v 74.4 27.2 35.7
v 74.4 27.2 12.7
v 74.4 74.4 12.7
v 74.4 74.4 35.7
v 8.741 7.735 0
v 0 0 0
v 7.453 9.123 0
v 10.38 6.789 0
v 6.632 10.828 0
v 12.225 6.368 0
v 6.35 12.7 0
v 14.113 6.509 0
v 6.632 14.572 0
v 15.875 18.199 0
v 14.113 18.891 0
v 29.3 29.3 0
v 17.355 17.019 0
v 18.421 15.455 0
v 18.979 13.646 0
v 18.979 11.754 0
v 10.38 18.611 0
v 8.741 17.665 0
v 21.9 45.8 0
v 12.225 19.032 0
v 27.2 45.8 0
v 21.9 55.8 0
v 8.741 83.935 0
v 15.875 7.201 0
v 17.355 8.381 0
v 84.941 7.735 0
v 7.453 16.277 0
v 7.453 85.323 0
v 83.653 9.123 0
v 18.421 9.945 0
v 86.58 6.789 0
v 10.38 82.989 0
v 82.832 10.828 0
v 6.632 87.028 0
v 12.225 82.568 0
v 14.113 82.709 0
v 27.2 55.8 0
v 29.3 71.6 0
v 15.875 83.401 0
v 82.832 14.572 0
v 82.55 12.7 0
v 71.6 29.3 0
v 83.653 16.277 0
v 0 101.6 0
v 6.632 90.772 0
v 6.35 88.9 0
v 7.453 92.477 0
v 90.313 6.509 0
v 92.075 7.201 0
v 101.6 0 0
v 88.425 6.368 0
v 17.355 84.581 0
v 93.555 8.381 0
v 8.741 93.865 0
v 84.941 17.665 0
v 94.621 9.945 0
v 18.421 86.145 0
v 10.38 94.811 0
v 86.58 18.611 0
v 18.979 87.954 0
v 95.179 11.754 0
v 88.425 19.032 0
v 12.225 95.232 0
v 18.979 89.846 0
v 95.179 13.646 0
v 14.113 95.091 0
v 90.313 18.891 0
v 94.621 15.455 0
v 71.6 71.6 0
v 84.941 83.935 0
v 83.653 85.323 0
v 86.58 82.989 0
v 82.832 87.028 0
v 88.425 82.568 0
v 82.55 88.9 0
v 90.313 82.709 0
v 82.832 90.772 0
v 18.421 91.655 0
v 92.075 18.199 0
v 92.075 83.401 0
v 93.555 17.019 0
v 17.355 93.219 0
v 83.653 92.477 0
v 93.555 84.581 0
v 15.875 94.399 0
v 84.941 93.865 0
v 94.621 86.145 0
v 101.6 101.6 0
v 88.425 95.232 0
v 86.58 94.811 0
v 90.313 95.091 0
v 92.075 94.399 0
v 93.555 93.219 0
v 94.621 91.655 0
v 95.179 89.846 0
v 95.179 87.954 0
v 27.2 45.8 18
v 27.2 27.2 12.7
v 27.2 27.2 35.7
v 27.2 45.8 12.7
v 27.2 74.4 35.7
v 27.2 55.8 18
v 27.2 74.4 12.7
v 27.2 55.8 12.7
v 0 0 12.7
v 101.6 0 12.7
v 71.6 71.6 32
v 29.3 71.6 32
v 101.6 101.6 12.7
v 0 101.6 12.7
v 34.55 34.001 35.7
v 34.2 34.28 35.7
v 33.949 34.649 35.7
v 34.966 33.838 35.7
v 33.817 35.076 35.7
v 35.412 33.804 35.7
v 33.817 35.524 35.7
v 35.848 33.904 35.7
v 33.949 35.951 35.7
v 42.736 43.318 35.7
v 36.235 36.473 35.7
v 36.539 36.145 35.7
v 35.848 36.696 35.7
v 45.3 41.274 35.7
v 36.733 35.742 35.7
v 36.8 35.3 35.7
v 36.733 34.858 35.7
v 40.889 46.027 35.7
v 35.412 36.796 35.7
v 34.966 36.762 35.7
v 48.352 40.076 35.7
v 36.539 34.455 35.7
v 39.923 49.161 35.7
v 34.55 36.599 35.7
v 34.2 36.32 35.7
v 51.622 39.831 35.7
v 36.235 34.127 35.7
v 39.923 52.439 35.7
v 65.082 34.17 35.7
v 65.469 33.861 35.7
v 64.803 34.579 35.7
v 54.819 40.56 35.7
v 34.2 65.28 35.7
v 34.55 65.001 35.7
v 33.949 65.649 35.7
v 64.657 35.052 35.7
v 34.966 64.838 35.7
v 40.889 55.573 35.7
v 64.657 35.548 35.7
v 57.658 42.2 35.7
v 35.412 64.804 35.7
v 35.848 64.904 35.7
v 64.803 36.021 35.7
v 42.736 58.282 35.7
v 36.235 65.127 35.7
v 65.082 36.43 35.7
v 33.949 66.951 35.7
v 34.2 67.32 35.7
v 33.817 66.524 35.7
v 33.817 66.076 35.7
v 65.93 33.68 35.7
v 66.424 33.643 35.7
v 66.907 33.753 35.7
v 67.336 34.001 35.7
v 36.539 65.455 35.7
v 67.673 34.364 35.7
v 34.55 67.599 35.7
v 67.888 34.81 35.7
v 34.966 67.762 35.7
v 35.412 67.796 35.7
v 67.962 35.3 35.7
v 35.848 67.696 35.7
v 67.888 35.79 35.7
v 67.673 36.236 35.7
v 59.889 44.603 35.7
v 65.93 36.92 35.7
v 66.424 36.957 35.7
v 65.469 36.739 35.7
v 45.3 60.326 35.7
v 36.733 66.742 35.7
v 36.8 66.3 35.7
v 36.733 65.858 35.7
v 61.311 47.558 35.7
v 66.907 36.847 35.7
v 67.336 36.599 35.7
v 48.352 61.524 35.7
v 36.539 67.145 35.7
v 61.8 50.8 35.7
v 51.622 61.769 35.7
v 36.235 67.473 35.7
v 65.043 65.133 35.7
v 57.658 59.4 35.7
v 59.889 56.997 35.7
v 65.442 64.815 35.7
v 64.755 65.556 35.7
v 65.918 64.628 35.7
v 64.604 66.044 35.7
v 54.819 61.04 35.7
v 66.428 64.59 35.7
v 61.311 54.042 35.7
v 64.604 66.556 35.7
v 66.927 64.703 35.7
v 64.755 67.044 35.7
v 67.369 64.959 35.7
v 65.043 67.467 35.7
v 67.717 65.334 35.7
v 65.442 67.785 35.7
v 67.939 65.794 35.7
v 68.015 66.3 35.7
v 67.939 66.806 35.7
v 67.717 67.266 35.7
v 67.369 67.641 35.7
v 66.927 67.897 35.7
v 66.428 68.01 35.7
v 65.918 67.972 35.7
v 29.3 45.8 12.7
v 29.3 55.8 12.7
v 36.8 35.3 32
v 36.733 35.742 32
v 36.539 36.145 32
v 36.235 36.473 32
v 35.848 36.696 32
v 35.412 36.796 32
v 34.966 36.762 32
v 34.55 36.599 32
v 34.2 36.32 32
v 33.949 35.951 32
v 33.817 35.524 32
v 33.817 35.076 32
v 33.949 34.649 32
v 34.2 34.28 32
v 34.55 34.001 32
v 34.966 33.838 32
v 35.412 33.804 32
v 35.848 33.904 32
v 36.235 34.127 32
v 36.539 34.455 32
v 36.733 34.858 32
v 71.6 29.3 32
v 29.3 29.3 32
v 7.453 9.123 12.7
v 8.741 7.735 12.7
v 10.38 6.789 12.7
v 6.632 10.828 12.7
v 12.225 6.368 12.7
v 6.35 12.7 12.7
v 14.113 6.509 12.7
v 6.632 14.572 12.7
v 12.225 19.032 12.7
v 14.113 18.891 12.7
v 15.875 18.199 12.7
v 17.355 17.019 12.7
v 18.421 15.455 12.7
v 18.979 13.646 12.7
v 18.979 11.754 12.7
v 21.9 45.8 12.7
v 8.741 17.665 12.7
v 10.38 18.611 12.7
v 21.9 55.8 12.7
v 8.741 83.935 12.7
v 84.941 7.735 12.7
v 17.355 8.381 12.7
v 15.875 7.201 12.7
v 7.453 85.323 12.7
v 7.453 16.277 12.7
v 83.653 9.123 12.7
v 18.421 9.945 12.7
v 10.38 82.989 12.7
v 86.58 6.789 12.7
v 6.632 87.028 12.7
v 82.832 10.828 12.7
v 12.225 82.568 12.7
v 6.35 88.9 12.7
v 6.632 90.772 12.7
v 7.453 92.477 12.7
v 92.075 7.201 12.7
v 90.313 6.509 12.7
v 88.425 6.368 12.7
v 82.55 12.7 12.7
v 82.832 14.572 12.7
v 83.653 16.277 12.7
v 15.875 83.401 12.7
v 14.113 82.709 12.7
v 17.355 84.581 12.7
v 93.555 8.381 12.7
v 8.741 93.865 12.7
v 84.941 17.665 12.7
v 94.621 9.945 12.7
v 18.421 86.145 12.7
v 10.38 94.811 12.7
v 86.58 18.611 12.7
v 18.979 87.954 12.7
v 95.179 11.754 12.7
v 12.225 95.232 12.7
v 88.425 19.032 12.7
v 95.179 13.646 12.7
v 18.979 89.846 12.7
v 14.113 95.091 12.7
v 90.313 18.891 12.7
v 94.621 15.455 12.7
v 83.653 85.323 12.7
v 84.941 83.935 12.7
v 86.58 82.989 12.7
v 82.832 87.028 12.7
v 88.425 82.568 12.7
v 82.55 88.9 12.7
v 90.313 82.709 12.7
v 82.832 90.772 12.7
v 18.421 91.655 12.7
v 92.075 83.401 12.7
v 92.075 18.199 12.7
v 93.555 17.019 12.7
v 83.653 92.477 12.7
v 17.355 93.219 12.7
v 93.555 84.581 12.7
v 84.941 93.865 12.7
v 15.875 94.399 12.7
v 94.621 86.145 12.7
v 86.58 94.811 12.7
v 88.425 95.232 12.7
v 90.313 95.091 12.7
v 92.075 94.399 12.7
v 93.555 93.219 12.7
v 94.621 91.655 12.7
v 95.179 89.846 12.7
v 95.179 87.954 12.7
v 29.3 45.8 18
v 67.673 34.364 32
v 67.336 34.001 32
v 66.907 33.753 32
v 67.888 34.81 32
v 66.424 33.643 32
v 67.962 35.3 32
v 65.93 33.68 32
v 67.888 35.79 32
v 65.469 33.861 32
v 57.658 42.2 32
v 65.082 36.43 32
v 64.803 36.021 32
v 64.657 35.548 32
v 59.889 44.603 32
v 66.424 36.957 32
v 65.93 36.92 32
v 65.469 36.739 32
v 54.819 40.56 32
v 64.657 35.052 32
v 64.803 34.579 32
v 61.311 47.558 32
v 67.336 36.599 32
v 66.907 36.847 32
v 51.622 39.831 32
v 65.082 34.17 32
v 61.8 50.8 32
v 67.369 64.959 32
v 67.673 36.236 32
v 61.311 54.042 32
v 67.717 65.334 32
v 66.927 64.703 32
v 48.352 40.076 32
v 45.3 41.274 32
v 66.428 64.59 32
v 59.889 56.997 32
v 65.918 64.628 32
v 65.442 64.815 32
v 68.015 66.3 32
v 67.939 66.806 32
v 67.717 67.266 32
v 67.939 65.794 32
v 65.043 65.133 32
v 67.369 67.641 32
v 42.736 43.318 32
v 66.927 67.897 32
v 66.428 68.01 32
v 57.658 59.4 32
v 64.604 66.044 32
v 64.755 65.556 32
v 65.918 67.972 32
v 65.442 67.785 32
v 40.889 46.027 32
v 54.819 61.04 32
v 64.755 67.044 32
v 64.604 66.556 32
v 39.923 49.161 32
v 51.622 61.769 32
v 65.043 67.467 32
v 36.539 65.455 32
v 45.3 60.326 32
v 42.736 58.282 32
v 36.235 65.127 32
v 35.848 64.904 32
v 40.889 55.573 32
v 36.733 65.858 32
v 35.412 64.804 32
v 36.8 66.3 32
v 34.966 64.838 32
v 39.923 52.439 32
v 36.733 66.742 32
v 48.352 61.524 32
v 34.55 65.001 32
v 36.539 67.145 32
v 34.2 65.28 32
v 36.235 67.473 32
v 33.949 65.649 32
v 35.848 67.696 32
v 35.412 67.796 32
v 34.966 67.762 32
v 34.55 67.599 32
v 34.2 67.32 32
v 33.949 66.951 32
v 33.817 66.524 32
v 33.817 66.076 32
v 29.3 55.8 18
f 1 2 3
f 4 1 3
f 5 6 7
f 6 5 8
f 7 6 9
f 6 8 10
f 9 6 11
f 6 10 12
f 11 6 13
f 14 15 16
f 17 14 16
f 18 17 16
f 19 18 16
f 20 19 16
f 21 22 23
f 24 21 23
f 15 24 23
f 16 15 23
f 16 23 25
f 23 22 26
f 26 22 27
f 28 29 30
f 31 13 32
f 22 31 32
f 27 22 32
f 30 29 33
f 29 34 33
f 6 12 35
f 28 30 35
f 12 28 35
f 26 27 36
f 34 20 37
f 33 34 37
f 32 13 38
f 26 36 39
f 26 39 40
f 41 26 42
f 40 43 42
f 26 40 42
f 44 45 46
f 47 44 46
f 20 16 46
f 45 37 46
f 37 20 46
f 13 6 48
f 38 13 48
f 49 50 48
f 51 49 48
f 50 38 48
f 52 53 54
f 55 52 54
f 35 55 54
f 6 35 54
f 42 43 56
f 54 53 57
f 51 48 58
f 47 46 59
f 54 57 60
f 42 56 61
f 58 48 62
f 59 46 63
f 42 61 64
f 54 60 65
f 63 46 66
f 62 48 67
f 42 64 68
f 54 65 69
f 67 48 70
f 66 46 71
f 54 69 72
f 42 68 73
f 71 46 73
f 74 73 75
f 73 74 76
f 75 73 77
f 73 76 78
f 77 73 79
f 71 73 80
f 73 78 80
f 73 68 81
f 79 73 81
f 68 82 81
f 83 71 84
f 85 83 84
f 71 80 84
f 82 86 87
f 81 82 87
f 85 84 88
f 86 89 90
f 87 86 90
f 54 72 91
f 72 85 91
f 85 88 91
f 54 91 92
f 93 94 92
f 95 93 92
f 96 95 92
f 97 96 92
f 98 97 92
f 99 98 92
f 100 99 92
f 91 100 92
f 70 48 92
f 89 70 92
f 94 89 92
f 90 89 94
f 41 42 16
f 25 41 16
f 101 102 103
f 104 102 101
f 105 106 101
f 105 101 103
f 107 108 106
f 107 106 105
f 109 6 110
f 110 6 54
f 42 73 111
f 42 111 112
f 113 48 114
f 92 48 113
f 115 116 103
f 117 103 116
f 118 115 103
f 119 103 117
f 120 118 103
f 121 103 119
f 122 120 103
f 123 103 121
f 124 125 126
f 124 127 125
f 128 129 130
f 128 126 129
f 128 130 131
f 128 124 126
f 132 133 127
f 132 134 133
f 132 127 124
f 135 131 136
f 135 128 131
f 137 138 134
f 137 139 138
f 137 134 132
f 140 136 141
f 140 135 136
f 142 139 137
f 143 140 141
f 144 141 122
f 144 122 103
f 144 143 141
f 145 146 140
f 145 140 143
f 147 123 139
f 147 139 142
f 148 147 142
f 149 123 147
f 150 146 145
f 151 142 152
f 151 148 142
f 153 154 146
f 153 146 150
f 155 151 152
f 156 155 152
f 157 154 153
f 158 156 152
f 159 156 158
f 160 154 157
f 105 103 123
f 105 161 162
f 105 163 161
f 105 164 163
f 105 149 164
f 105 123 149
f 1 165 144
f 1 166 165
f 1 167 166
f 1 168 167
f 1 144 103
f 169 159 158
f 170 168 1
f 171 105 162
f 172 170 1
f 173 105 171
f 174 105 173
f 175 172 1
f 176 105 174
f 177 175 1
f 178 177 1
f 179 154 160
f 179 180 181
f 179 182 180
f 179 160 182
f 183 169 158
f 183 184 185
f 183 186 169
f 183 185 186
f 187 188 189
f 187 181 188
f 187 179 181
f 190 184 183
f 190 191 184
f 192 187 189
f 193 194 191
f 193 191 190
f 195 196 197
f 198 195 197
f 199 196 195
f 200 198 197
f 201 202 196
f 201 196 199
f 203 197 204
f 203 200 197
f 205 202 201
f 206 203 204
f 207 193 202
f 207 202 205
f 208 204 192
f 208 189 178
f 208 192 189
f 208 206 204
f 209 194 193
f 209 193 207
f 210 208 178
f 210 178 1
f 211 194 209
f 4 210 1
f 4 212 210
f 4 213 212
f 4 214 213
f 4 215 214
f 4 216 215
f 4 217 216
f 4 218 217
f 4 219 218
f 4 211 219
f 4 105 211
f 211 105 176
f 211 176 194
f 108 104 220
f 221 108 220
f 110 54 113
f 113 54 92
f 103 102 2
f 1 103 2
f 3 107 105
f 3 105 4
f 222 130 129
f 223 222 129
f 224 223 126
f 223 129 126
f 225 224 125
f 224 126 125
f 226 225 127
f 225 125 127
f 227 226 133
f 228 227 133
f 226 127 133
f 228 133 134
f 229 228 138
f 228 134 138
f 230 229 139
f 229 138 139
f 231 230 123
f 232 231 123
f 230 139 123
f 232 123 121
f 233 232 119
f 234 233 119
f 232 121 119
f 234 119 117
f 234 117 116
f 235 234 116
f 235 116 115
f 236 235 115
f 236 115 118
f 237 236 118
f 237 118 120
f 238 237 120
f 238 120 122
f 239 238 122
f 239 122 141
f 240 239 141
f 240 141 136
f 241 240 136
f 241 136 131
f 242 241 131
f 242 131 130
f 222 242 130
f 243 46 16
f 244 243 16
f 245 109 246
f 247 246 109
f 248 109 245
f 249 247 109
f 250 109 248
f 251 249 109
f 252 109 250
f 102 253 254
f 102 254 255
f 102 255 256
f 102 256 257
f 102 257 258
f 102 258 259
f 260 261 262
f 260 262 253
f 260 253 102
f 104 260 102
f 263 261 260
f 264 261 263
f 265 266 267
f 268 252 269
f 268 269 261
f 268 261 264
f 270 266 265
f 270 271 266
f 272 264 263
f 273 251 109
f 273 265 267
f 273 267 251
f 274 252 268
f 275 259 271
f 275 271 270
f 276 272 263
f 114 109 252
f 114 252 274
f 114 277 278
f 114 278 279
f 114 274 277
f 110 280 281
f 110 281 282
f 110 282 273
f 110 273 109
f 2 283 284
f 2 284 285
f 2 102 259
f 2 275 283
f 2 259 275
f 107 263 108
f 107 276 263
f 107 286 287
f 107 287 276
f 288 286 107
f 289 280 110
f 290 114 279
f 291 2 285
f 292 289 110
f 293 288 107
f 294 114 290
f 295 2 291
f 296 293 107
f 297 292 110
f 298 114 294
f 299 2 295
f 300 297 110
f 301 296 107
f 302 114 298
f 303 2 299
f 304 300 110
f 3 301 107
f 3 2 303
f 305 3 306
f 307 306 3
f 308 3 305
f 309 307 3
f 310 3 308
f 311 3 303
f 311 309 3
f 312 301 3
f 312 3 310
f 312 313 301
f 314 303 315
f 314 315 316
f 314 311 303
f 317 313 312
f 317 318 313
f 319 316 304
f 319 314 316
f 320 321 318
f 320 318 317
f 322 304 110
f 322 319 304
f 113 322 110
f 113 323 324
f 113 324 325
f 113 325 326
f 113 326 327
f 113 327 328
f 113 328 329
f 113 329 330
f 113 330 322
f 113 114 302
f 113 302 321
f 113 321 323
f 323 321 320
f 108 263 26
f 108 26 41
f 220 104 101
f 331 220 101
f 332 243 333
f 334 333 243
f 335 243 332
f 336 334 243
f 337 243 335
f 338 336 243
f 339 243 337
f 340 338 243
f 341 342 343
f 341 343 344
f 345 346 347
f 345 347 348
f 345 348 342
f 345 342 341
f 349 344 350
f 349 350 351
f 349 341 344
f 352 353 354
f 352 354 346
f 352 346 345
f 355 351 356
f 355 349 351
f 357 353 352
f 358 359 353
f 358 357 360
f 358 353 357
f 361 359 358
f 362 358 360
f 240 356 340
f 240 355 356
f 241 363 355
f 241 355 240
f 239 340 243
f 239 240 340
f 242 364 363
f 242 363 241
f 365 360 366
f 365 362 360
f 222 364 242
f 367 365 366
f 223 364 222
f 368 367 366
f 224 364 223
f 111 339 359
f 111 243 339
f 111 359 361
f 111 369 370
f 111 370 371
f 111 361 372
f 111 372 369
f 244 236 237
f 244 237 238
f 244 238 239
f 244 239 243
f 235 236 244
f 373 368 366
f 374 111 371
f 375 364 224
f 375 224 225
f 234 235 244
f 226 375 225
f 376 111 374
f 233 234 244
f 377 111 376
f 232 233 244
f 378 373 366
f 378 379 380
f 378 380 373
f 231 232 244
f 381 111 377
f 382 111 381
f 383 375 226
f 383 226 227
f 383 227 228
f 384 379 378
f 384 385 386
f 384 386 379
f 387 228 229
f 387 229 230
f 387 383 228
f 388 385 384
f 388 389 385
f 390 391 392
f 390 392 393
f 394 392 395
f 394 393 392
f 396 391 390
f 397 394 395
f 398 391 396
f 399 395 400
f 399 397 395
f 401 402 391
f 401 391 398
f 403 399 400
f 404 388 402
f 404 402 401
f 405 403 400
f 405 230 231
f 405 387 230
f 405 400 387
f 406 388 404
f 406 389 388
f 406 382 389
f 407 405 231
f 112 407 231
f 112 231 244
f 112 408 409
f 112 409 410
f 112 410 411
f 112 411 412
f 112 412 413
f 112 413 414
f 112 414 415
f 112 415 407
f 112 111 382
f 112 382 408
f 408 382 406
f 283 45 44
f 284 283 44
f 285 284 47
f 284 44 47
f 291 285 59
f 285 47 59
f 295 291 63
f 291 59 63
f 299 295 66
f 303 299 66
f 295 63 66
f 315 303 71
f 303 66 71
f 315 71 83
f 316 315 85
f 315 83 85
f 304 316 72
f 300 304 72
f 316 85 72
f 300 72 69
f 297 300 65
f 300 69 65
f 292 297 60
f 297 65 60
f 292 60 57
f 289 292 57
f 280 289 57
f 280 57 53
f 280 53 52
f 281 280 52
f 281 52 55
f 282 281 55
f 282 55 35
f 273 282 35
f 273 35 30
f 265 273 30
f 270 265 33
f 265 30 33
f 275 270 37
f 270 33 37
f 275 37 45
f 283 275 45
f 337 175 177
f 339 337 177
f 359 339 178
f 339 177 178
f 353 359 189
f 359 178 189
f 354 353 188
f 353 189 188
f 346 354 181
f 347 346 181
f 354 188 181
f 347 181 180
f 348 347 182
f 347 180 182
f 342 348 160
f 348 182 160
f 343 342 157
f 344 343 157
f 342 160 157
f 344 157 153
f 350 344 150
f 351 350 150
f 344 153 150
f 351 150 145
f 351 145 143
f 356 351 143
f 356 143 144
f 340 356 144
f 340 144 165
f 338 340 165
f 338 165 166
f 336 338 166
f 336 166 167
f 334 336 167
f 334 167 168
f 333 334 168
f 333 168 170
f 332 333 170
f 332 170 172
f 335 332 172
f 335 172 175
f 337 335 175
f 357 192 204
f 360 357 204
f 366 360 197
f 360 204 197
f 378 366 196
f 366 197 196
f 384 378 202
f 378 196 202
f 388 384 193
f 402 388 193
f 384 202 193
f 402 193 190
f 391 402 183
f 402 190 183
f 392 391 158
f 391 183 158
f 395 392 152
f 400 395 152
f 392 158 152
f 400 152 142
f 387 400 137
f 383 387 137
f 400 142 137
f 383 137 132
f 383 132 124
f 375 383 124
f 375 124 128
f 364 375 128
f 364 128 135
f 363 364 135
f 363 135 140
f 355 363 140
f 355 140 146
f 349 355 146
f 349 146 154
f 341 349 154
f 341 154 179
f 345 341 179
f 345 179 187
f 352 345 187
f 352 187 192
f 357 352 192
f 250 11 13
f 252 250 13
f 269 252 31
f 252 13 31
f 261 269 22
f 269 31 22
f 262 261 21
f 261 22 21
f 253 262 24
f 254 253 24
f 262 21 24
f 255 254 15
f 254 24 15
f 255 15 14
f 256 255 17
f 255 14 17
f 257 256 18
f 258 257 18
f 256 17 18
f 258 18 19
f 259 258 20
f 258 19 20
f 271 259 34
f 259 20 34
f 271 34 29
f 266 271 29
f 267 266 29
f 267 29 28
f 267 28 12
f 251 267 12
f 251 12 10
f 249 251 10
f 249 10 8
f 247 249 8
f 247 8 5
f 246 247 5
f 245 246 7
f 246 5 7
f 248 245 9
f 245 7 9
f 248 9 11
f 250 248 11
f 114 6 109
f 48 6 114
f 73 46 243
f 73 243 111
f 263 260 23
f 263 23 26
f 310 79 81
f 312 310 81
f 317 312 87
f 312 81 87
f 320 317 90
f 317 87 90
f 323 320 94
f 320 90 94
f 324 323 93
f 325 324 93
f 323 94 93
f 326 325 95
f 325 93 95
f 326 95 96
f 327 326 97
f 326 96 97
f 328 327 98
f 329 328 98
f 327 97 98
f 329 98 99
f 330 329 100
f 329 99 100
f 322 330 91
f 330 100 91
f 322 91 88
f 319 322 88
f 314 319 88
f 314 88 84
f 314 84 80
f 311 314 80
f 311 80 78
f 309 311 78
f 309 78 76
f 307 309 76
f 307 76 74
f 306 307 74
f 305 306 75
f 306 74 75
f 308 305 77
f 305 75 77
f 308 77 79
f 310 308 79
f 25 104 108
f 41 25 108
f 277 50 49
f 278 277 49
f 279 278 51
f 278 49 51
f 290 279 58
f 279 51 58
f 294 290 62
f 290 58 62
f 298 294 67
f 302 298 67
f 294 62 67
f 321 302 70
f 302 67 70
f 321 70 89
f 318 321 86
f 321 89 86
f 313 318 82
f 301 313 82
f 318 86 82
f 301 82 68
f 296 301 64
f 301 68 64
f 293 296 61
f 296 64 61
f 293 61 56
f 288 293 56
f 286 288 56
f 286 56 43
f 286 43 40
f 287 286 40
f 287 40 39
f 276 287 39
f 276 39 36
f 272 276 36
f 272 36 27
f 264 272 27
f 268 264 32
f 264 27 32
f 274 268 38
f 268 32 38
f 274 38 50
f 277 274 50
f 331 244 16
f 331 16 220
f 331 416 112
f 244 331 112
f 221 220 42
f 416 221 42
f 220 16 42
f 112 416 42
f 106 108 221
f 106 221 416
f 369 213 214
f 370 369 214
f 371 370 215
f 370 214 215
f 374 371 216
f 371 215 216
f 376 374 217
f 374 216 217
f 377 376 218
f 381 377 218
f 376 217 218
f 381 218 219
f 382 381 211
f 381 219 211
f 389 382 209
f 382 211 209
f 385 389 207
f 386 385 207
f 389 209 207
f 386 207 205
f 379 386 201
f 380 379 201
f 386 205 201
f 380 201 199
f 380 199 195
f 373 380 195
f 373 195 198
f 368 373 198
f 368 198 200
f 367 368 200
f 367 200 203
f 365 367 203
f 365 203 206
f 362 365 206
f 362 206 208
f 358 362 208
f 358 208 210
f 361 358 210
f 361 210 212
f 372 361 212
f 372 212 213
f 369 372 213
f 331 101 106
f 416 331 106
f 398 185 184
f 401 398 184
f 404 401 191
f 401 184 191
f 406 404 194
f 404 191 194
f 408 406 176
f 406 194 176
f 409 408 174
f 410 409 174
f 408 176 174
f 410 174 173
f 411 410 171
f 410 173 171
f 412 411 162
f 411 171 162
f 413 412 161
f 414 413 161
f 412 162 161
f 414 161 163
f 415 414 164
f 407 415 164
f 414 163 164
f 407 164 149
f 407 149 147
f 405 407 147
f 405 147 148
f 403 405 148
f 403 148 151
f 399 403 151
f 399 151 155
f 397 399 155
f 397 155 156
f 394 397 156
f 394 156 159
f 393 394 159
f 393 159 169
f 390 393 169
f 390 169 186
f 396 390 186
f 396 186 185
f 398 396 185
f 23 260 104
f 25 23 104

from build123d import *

# Parameters (mm, degrees)
SKETCH1_W           = 101.6
SKETCH1_H           = 101.6
BOSS_EXTRUDE1_DEPTH = 12.7
SKETCH4_W           = 47.2
SKETCH4_H           = 47.2
BOSS_EXTRUDE3_DEPTH = 23
SKETCH5_W           = 42.3
SKETCH5_H           = 42.3
CUT_EXTRUDE1_DEPTH  = 32
SKETCH6_R           = 11
SKETCH6_R_2         = 1.5
SKETCH6_R_3         = 1.715206785
SKETCH6_R_4         = 1.661518809
CUT_EXTRUDE2_DEPTH  = 10
SKETCH7_W           = 5.3
SKETCH7_H           = 10
CUT_EXTRUDE3_DEPTH  = 5
SKETCH8_W           = 5.3
SKETCH8_H           = 10
CUT_EXTRUDE5_DEPTH  = 12.7
SKETCH9_R           = 6.35
CUT_EXTRUDE6_DEPTH  = 12.7


with BuildPart() as part:
    # Sketch1 → Boss-Extrude1 (new body)
    with BuildSketch(Plane.XY):
        with Locations((50.8, 50.8)):
            Rectangle(SKETCH1_W, SKETCH1_H)
    extrude(amount=BOSS_EXTRUDE1_DEPTH)

    # Sketch4 → Boss-Extrude3 (add)
    with BuildSketch(Plane.XY.offset(12.7)):
        with Locations((50.8, 50.8)):
            Rectangle(SKETCH4_W, SKETCH4_H)
    extrude(amount=BOSS_EXTRUDE3_DEPTH)

    # Sketch5 → Cut-Extrude1 (cut)
    with BuildSketch(Plane(origin=(0, 0, 0), x_dir=(-1, 0, 0), z_dir=(0, 0, -1))):
        with Locations((-50.45, 50.45)):
            Rectangle(SKETCH5_W, SKETCH5_H)
    extrude(amount=-CUT_EXTRUDE1_DEPTH, mode=Mode.SUBTRACT)

    # Sketch6 → Cut-Extrude2 (cut)
    with BuildSketch(Plane.XY.offset(35.7)):
        with Locations((50.8, 50.8)):
            Circle(SKETCH6_R)
        with Locations((35.3, 66.3)):
            Circle(SKETCH6_R_2)
        with Locations((66.3, 66.3)):
            Circle(SKETCH6_R_3)
        with Locations((66.3, 35.3)):
            Circle(SKETCH6_R_4)
        with Locations((35.3, 35.3)):
            Circle(SKETCH6_R_2)
    extrude(amount=-CUT_EXTRUDE2_DEPTH, mode=Mode.SUBTRACT)

    # Sketch7 → Cut-Extrude3 (cut)
    with BuildSketch(Plane.ZY.offset(-27.2)):
        with Locations((15.35, 50.8)):
            Rectangle(SKETCH7_W, SKETCH7_H)
    extrude(amount=-CUT_EXTRUDE3_DEPTH, mode=Mode.SUBTRACT)

    # Sketch8 → Cut-Extrude5 (cut)
    with BuildSketch(Plane.XY.offset(12.7)):
        with Locations((24.55, 50.8)):
            Rectangle(SKETCH8_W, SKETCH8_H)
    extrude(amount=-CUT_EXTRUDE5_DEPTH, mode=Mode.SUBTRACT)

    # Sketch9 → Cut-Extrude6 (cut)
    with BuildSketch(Plane(origin=(0, 0, 0), x_dir=(-1, 0, 0), z_dir=(0, 0, -1))):
        with Locations((-88.9, 88.9)):
            Circle(SKETCH9_R)
        with Locations((-12.7, 88.9)):
            Circle(SKETCH9_R)
        with Locations((-12.7, 12.7)):
            Circle(SKETCH9_R)
        with Locations((-88.9, 12.7)):
            Circle(SKETCH9_R)
    extrude(amount=-CUT_EXTRUDE6_DEPTH, mode=Mode.SUBTRACT)


solid = part.part
